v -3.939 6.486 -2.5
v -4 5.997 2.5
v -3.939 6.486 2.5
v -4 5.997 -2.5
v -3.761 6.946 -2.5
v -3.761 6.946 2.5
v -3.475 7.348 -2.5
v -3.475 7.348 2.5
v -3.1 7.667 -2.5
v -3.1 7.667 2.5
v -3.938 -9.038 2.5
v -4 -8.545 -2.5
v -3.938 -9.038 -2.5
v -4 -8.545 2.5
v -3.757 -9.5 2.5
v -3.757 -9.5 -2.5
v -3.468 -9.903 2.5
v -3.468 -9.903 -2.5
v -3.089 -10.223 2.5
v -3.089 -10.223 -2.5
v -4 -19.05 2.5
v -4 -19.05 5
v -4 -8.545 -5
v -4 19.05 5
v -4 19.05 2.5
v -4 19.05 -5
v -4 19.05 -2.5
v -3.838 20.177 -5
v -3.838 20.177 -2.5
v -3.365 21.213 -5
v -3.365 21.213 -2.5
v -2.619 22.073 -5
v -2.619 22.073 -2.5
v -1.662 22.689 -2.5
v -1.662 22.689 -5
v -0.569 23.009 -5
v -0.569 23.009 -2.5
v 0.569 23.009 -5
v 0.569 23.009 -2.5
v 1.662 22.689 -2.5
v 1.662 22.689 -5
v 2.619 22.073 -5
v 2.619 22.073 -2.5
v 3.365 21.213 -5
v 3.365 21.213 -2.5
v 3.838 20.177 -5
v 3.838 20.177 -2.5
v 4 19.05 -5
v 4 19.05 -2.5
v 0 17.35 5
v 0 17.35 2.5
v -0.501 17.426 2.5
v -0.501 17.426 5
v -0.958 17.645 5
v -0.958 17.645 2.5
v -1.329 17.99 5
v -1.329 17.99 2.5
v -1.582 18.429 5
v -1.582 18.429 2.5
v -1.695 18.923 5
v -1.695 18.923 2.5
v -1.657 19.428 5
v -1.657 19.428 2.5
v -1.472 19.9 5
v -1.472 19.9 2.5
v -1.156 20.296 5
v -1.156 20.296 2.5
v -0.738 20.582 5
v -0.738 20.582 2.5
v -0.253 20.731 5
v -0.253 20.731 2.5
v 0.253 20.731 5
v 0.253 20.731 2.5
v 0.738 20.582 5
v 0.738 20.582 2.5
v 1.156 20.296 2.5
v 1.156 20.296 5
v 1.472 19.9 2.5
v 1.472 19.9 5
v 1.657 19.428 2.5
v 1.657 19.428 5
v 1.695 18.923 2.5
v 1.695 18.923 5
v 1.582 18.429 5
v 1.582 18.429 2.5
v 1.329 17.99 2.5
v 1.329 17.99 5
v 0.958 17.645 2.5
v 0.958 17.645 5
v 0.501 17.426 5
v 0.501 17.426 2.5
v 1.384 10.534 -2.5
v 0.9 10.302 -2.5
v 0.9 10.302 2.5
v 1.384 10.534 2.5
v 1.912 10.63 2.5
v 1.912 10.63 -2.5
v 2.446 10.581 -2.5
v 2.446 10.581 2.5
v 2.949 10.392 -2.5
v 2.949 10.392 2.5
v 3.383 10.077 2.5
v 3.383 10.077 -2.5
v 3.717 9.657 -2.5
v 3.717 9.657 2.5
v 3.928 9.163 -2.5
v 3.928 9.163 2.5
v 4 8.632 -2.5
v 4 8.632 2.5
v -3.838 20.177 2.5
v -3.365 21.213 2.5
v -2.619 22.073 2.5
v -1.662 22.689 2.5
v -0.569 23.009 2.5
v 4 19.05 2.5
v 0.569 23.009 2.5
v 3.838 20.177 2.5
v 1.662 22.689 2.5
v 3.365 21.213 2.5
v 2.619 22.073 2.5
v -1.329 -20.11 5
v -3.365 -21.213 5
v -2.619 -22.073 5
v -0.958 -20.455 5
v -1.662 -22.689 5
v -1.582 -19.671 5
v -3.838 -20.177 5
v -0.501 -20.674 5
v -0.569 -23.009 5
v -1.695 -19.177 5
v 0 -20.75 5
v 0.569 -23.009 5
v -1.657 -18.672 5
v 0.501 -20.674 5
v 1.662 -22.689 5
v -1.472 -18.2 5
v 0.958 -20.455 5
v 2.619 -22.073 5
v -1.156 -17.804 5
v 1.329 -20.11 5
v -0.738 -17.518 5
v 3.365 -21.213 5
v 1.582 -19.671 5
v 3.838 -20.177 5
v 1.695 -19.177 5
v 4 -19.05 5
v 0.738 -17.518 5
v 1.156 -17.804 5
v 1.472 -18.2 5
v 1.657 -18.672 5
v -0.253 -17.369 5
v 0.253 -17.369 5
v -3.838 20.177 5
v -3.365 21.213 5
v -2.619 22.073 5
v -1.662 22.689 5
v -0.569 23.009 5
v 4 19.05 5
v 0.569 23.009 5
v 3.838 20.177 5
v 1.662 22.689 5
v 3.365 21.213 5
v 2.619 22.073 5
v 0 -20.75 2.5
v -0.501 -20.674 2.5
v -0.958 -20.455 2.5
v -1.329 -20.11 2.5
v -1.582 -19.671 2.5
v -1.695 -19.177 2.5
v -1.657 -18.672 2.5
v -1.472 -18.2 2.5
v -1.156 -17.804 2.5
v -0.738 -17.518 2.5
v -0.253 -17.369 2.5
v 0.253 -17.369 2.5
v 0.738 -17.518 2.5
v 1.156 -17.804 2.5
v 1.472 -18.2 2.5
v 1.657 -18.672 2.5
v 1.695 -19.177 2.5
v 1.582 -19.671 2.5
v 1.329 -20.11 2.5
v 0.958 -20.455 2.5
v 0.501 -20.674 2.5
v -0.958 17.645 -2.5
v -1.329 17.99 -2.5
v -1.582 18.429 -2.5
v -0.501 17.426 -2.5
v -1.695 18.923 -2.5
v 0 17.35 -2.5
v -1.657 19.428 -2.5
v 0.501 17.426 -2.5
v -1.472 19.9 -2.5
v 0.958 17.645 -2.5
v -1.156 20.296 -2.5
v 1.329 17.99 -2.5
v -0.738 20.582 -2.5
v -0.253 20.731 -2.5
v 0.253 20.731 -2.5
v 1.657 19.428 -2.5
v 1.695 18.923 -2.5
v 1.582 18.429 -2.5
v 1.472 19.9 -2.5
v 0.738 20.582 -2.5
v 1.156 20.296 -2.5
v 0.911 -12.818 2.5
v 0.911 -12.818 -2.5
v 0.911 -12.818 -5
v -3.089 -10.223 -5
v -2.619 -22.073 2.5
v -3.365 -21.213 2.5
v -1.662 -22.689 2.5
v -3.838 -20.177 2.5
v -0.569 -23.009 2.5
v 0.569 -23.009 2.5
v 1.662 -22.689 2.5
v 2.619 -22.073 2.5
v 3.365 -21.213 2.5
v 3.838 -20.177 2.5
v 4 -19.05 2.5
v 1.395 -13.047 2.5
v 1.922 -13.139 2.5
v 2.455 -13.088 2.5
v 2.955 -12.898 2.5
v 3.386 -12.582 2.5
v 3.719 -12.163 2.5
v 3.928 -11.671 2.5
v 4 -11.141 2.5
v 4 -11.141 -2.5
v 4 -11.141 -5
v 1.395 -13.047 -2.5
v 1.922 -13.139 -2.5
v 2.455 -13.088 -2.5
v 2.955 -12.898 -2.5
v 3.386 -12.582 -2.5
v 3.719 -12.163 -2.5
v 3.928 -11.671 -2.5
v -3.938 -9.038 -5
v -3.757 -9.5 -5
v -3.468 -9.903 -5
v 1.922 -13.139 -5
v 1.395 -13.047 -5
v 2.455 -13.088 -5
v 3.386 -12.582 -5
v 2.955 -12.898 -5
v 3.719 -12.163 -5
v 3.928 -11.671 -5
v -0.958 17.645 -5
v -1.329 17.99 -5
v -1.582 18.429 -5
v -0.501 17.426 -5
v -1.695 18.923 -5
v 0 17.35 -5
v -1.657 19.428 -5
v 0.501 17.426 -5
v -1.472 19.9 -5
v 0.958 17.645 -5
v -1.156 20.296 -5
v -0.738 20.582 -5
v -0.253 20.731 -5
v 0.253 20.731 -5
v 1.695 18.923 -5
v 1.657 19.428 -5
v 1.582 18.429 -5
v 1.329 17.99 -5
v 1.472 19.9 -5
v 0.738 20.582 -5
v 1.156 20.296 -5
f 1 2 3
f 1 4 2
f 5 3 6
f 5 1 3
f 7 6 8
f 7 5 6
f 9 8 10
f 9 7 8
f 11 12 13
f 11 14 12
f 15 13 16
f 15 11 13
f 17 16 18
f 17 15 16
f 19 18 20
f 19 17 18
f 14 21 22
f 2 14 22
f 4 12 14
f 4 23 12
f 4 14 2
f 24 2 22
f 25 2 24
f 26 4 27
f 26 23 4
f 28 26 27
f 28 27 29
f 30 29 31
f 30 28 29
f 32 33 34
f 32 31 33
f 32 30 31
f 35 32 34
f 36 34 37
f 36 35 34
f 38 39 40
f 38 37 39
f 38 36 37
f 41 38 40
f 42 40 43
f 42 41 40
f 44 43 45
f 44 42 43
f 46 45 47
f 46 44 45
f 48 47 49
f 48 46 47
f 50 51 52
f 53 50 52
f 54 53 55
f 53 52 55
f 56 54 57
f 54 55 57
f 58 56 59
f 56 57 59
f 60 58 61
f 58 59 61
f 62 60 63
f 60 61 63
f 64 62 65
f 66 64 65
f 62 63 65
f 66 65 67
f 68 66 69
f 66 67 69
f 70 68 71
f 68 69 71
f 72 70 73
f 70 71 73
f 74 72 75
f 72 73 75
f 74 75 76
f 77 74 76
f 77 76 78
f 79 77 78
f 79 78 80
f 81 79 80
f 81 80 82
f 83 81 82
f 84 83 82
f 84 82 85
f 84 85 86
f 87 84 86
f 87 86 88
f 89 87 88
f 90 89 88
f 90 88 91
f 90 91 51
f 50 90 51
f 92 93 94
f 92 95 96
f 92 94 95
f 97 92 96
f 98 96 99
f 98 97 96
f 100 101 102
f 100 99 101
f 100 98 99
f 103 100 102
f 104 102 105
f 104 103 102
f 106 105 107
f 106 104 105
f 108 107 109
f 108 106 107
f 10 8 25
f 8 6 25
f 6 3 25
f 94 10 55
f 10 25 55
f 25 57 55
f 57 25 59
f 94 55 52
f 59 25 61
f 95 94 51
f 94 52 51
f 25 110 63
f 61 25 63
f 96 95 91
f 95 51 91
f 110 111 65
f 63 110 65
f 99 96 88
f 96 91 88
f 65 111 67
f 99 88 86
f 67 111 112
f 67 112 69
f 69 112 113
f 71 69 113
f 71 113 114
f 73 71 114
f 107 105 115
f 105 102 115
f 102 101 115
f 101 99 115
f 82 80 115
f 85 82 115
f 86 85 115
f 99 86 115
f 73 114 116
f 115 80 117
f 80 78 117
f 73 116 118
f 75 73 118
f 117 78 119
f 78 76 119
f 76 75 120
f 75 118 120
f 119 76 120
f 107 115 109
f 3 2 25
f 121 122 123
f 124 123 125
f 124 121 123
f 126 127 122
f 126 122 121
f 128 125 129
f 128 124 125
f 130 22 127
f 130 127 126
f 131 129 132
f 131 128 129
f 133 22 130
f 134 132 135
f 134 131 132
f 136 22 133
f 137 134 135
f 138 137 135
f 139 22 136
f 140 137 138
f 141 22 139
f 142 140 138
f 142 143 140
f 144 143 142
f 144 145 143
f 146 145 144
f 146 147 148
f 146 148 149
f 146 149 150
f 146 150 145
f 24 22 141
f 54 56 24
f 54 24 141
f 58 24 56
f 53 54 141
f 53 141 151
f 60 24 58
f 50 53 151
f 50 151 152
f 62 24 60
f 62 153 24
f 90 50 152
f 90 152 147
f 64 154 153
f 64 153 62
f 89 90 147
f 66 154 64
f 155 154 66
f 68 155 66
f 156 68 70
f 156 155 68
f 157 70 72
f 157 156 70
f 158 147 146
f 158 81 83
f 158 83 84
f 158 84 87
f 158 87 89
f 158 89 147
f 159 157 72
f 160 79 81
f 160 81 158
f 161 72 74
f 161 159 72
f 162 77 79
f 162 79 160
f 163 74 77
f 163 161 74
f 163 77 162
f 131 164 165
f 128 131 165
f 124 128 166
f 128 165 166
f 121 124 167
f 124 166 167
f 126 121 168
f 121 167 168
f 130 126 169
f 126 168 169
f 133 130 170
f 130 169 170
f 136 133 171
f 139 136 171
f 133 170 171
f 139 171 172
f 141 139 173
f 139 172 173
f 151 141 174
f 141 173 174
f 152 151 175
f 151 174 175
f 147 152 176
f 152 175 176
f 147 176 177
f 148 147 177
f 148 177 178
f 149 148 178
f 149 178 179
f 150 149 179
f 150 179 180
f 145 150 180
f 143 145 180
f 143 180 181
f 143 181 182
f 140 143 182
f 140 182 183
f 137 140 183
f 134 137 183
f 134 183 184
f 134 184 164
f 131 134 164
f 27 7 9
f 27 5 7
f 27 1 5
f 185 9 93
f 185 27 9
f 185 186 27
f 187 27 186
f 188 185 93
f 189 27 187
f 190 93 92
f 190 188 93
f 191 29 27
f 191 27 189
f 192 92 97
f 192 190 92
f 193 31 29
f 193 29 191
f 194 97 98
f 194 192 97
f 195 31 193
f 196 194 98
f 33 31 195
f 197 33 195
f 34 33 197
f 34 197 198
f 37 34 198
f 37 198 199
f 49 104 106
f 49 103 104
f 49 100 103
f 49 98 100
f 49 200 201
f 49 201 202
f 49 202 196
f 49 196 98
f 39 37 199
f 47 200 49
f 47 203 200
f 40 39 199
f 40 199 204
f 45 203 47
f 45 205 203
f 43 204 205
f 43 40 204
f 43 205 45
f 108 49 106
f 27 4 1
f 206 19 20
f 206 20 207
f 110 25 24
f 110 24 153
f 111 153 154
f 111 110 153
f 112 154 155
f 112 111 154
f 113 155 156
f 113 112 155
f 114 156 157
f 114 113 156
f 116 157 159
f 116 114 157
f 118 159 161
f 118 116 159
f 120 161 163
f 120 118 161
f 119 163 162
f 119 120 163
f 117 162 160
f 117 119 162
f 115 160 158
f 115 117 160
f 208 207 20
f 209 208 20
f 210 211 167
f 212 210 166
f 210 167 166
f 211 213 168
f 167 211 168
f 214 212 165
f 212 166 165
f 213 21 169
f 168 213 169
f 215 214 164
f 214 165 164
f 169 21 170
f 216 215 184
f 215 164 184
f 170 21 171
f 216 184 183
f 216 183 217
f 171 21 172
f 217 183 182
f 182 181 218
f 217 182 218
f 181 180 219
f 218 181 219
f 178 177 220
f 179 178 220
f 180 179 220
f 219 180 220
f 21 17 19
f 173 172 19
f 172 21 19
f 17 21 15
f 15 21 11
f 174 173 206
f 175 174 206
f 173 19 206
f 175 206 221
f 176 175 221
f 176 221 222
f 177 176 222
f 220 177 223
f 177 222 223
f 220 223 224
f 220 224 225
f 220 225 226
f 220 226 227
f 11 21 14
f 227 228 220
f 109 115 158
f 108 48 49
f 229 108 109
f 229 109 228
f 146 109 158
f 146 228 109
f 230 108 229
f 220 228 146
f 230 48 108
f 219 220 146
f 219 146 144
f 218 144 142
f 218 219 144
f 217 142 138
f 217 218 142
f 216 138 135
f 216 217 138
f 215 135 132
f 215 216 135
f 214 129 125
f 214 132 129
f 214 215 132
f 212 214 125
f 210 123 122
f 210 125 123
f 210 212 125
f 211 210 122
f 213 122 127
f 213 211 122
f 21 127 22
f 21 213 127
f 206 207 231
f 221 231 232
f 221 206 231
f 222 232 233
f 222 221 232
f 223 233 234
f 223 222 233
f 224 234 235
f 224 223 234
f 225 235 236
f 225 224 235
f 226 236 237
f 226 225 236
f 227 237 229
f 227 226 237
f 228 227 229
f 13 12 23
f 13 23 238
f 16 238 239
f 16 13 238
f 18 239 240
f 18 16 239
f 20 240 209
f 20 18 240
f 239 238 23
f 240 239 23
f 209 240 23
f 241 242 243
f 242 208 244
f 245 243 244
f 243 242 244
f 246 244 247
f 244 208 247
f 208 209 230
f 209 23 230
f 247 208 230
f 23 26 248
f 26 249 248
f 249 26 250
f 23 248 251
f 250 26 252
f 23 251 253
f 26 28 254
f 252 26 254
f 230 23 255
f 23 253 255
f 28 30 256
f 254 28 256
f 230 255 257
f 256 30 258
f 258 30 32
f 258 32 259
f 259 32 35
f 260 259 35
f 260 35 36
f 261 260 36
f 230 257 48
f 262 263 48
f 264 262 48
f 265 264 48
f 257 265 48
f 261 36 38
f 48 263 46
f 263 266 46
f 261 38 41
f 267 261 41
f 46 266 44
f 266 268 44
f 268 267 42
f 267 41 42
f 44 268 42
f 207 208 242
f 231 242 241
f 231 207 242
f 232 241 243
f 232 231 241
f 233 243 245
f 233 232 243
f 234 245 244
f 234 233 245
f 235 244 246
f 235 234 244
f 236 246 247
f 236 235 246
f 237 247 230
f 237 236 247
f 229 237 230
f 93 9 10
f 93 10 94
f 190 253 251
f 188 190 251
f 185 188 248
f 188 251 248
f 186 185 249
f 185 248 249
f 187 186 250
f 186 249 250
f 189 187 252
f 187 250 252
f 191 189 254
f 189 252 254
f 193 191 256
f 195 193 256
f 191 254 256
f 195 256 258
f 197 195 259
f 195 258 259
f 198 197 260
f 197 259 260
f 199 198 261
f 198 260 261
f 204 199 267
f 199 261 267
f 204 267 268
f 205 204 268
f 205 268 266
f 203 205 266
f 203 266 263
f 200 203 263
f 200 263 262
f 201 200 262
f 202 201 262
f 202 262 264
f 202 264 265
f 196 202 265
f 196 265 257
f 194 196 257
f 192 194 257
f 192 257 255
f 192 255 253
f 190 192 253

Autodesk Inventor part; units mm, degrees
ref_plane "YZ Plane" through (0, 0, 0) normal (1, 0, 0) x (0, 1, 0)
ref_plane "XZ Plane" through (0, 0, 0) normal (0, 1, 0) x (-1, 0, 0)
ref_plane "XY Plane" through (0, 0, 0) normal (0, 0, 1) x (1, 0, 0)
sketch "Sketch1" plane through (0, 0, 0) normal (0, 0, 1) x (1, 0, 0)
  line L0 (0, 23.05) -> (0, 23.05)
  line L1 (4, 19.05) -> (4, 12.3438)
  line L2 (0, -23.05) -> (0, -23.05)
  line L3 (-4, -19.05) -> (-4, -9.6314)
  line L4 (-4, 23.05) -> (0, 23.05) construction
  line L5 (0, 23.05) -> (0, 0) construction
  line L6 (0, 0) -> (-4, 0) construction
  line L7 (-4, 0) -> (-4, 23.05) construction
  arc A0 (4, 19.05) -> (0, 23.05) centre (0, 19.05) ccw
  arc A1 (0, 23.05) -> (-4, 19.05) centre (0, 19.05) ccw
  arc A2 (-4, -19.05) -> (0, -23.05) centre (0, -19.05) ccw
  arc A3 (0, -23.05) -> (4, -19.05) centre (0, -19.05) ccw
  line L8 (-4, 7.0746) -> (4, 12.3438)
  line L9 (-4, 7.0746) -> (-4, 19.05)
  line L10 (4, 12.3438) -> (4, -14.8227)
  line L11 (-4, -9.6314) -> (4, -14.8227)
  line L12 (-4, -9.6314) -> (-4, 7.0746)
  line L13 (4, -14.8227) -> (4, -19.05)
  dimension "d0" = 4
  dimension "d6" = 38.1
extrude "Extrusion5" add sketch "Sketch1" along normal mid plane 10
extrude "Extrusion6" cut sketch "Sketch1" along normal mid plane 5 contours L1 L8 L9 A1 A0 | L13 A3 A2 L3 L11
sketch "Sketch4" plane through (0, 0, 5) normal (0, 0, 1) x (1, 0, 0)
  arc A0 (4, 19.05) -> (-4, 19.05) centre (0, 19.05) ccw projected
  arc A1 (-4, -19.05) -> (4, -19.05) centre (0, -19.05) ccw projected
  point P0 (0, 0)
hole "Hole3" at (0, -19.05, 5) at (0, 19.05, 5) direction (0, 0, -1) diameter 3.4 end through all
fillet "Fillet1" radius 2 4 edges at (4, -14.8227, 0) (4, 12.3438, 0) (-4, 7.0746, 0) (-4, -9.6314, 0)
sketch "Sketch5" plane through (0, 0, -2.5) normal (0, 0, 1) x (1, 0, 0)
  circle A0 centre (0, -19.05) radius 1.7 projected
  arc A1 (-4, -19.05) -> (4, -19.05) centre (0, -19.05) ccw projected
  line L0 (4, -11.1407) -> (4, -19.05) projected
  arc A2 (0.9113, -12.8184) -> (4, -11.1407) centre (2, -11.1407) ccw projected
  line L1 (0.9113, -12.8184) -> (-3.0887, -10.2228) projected
  arc A3 (-4, -8.5451) -> (-3.0887, -10.2228) centre (-2, -8.5451) ccw projected
  line L2 (-4, -19.05) -> (-4, -8.5451) projected
  point P0 (0, 0)
extrude "Extrusion7" cut sketch "Sketch5" against normal through all
equation "\"d6\" = LengthK"
equation "\"LengthK\" = 38.1"
properties part number "F"
